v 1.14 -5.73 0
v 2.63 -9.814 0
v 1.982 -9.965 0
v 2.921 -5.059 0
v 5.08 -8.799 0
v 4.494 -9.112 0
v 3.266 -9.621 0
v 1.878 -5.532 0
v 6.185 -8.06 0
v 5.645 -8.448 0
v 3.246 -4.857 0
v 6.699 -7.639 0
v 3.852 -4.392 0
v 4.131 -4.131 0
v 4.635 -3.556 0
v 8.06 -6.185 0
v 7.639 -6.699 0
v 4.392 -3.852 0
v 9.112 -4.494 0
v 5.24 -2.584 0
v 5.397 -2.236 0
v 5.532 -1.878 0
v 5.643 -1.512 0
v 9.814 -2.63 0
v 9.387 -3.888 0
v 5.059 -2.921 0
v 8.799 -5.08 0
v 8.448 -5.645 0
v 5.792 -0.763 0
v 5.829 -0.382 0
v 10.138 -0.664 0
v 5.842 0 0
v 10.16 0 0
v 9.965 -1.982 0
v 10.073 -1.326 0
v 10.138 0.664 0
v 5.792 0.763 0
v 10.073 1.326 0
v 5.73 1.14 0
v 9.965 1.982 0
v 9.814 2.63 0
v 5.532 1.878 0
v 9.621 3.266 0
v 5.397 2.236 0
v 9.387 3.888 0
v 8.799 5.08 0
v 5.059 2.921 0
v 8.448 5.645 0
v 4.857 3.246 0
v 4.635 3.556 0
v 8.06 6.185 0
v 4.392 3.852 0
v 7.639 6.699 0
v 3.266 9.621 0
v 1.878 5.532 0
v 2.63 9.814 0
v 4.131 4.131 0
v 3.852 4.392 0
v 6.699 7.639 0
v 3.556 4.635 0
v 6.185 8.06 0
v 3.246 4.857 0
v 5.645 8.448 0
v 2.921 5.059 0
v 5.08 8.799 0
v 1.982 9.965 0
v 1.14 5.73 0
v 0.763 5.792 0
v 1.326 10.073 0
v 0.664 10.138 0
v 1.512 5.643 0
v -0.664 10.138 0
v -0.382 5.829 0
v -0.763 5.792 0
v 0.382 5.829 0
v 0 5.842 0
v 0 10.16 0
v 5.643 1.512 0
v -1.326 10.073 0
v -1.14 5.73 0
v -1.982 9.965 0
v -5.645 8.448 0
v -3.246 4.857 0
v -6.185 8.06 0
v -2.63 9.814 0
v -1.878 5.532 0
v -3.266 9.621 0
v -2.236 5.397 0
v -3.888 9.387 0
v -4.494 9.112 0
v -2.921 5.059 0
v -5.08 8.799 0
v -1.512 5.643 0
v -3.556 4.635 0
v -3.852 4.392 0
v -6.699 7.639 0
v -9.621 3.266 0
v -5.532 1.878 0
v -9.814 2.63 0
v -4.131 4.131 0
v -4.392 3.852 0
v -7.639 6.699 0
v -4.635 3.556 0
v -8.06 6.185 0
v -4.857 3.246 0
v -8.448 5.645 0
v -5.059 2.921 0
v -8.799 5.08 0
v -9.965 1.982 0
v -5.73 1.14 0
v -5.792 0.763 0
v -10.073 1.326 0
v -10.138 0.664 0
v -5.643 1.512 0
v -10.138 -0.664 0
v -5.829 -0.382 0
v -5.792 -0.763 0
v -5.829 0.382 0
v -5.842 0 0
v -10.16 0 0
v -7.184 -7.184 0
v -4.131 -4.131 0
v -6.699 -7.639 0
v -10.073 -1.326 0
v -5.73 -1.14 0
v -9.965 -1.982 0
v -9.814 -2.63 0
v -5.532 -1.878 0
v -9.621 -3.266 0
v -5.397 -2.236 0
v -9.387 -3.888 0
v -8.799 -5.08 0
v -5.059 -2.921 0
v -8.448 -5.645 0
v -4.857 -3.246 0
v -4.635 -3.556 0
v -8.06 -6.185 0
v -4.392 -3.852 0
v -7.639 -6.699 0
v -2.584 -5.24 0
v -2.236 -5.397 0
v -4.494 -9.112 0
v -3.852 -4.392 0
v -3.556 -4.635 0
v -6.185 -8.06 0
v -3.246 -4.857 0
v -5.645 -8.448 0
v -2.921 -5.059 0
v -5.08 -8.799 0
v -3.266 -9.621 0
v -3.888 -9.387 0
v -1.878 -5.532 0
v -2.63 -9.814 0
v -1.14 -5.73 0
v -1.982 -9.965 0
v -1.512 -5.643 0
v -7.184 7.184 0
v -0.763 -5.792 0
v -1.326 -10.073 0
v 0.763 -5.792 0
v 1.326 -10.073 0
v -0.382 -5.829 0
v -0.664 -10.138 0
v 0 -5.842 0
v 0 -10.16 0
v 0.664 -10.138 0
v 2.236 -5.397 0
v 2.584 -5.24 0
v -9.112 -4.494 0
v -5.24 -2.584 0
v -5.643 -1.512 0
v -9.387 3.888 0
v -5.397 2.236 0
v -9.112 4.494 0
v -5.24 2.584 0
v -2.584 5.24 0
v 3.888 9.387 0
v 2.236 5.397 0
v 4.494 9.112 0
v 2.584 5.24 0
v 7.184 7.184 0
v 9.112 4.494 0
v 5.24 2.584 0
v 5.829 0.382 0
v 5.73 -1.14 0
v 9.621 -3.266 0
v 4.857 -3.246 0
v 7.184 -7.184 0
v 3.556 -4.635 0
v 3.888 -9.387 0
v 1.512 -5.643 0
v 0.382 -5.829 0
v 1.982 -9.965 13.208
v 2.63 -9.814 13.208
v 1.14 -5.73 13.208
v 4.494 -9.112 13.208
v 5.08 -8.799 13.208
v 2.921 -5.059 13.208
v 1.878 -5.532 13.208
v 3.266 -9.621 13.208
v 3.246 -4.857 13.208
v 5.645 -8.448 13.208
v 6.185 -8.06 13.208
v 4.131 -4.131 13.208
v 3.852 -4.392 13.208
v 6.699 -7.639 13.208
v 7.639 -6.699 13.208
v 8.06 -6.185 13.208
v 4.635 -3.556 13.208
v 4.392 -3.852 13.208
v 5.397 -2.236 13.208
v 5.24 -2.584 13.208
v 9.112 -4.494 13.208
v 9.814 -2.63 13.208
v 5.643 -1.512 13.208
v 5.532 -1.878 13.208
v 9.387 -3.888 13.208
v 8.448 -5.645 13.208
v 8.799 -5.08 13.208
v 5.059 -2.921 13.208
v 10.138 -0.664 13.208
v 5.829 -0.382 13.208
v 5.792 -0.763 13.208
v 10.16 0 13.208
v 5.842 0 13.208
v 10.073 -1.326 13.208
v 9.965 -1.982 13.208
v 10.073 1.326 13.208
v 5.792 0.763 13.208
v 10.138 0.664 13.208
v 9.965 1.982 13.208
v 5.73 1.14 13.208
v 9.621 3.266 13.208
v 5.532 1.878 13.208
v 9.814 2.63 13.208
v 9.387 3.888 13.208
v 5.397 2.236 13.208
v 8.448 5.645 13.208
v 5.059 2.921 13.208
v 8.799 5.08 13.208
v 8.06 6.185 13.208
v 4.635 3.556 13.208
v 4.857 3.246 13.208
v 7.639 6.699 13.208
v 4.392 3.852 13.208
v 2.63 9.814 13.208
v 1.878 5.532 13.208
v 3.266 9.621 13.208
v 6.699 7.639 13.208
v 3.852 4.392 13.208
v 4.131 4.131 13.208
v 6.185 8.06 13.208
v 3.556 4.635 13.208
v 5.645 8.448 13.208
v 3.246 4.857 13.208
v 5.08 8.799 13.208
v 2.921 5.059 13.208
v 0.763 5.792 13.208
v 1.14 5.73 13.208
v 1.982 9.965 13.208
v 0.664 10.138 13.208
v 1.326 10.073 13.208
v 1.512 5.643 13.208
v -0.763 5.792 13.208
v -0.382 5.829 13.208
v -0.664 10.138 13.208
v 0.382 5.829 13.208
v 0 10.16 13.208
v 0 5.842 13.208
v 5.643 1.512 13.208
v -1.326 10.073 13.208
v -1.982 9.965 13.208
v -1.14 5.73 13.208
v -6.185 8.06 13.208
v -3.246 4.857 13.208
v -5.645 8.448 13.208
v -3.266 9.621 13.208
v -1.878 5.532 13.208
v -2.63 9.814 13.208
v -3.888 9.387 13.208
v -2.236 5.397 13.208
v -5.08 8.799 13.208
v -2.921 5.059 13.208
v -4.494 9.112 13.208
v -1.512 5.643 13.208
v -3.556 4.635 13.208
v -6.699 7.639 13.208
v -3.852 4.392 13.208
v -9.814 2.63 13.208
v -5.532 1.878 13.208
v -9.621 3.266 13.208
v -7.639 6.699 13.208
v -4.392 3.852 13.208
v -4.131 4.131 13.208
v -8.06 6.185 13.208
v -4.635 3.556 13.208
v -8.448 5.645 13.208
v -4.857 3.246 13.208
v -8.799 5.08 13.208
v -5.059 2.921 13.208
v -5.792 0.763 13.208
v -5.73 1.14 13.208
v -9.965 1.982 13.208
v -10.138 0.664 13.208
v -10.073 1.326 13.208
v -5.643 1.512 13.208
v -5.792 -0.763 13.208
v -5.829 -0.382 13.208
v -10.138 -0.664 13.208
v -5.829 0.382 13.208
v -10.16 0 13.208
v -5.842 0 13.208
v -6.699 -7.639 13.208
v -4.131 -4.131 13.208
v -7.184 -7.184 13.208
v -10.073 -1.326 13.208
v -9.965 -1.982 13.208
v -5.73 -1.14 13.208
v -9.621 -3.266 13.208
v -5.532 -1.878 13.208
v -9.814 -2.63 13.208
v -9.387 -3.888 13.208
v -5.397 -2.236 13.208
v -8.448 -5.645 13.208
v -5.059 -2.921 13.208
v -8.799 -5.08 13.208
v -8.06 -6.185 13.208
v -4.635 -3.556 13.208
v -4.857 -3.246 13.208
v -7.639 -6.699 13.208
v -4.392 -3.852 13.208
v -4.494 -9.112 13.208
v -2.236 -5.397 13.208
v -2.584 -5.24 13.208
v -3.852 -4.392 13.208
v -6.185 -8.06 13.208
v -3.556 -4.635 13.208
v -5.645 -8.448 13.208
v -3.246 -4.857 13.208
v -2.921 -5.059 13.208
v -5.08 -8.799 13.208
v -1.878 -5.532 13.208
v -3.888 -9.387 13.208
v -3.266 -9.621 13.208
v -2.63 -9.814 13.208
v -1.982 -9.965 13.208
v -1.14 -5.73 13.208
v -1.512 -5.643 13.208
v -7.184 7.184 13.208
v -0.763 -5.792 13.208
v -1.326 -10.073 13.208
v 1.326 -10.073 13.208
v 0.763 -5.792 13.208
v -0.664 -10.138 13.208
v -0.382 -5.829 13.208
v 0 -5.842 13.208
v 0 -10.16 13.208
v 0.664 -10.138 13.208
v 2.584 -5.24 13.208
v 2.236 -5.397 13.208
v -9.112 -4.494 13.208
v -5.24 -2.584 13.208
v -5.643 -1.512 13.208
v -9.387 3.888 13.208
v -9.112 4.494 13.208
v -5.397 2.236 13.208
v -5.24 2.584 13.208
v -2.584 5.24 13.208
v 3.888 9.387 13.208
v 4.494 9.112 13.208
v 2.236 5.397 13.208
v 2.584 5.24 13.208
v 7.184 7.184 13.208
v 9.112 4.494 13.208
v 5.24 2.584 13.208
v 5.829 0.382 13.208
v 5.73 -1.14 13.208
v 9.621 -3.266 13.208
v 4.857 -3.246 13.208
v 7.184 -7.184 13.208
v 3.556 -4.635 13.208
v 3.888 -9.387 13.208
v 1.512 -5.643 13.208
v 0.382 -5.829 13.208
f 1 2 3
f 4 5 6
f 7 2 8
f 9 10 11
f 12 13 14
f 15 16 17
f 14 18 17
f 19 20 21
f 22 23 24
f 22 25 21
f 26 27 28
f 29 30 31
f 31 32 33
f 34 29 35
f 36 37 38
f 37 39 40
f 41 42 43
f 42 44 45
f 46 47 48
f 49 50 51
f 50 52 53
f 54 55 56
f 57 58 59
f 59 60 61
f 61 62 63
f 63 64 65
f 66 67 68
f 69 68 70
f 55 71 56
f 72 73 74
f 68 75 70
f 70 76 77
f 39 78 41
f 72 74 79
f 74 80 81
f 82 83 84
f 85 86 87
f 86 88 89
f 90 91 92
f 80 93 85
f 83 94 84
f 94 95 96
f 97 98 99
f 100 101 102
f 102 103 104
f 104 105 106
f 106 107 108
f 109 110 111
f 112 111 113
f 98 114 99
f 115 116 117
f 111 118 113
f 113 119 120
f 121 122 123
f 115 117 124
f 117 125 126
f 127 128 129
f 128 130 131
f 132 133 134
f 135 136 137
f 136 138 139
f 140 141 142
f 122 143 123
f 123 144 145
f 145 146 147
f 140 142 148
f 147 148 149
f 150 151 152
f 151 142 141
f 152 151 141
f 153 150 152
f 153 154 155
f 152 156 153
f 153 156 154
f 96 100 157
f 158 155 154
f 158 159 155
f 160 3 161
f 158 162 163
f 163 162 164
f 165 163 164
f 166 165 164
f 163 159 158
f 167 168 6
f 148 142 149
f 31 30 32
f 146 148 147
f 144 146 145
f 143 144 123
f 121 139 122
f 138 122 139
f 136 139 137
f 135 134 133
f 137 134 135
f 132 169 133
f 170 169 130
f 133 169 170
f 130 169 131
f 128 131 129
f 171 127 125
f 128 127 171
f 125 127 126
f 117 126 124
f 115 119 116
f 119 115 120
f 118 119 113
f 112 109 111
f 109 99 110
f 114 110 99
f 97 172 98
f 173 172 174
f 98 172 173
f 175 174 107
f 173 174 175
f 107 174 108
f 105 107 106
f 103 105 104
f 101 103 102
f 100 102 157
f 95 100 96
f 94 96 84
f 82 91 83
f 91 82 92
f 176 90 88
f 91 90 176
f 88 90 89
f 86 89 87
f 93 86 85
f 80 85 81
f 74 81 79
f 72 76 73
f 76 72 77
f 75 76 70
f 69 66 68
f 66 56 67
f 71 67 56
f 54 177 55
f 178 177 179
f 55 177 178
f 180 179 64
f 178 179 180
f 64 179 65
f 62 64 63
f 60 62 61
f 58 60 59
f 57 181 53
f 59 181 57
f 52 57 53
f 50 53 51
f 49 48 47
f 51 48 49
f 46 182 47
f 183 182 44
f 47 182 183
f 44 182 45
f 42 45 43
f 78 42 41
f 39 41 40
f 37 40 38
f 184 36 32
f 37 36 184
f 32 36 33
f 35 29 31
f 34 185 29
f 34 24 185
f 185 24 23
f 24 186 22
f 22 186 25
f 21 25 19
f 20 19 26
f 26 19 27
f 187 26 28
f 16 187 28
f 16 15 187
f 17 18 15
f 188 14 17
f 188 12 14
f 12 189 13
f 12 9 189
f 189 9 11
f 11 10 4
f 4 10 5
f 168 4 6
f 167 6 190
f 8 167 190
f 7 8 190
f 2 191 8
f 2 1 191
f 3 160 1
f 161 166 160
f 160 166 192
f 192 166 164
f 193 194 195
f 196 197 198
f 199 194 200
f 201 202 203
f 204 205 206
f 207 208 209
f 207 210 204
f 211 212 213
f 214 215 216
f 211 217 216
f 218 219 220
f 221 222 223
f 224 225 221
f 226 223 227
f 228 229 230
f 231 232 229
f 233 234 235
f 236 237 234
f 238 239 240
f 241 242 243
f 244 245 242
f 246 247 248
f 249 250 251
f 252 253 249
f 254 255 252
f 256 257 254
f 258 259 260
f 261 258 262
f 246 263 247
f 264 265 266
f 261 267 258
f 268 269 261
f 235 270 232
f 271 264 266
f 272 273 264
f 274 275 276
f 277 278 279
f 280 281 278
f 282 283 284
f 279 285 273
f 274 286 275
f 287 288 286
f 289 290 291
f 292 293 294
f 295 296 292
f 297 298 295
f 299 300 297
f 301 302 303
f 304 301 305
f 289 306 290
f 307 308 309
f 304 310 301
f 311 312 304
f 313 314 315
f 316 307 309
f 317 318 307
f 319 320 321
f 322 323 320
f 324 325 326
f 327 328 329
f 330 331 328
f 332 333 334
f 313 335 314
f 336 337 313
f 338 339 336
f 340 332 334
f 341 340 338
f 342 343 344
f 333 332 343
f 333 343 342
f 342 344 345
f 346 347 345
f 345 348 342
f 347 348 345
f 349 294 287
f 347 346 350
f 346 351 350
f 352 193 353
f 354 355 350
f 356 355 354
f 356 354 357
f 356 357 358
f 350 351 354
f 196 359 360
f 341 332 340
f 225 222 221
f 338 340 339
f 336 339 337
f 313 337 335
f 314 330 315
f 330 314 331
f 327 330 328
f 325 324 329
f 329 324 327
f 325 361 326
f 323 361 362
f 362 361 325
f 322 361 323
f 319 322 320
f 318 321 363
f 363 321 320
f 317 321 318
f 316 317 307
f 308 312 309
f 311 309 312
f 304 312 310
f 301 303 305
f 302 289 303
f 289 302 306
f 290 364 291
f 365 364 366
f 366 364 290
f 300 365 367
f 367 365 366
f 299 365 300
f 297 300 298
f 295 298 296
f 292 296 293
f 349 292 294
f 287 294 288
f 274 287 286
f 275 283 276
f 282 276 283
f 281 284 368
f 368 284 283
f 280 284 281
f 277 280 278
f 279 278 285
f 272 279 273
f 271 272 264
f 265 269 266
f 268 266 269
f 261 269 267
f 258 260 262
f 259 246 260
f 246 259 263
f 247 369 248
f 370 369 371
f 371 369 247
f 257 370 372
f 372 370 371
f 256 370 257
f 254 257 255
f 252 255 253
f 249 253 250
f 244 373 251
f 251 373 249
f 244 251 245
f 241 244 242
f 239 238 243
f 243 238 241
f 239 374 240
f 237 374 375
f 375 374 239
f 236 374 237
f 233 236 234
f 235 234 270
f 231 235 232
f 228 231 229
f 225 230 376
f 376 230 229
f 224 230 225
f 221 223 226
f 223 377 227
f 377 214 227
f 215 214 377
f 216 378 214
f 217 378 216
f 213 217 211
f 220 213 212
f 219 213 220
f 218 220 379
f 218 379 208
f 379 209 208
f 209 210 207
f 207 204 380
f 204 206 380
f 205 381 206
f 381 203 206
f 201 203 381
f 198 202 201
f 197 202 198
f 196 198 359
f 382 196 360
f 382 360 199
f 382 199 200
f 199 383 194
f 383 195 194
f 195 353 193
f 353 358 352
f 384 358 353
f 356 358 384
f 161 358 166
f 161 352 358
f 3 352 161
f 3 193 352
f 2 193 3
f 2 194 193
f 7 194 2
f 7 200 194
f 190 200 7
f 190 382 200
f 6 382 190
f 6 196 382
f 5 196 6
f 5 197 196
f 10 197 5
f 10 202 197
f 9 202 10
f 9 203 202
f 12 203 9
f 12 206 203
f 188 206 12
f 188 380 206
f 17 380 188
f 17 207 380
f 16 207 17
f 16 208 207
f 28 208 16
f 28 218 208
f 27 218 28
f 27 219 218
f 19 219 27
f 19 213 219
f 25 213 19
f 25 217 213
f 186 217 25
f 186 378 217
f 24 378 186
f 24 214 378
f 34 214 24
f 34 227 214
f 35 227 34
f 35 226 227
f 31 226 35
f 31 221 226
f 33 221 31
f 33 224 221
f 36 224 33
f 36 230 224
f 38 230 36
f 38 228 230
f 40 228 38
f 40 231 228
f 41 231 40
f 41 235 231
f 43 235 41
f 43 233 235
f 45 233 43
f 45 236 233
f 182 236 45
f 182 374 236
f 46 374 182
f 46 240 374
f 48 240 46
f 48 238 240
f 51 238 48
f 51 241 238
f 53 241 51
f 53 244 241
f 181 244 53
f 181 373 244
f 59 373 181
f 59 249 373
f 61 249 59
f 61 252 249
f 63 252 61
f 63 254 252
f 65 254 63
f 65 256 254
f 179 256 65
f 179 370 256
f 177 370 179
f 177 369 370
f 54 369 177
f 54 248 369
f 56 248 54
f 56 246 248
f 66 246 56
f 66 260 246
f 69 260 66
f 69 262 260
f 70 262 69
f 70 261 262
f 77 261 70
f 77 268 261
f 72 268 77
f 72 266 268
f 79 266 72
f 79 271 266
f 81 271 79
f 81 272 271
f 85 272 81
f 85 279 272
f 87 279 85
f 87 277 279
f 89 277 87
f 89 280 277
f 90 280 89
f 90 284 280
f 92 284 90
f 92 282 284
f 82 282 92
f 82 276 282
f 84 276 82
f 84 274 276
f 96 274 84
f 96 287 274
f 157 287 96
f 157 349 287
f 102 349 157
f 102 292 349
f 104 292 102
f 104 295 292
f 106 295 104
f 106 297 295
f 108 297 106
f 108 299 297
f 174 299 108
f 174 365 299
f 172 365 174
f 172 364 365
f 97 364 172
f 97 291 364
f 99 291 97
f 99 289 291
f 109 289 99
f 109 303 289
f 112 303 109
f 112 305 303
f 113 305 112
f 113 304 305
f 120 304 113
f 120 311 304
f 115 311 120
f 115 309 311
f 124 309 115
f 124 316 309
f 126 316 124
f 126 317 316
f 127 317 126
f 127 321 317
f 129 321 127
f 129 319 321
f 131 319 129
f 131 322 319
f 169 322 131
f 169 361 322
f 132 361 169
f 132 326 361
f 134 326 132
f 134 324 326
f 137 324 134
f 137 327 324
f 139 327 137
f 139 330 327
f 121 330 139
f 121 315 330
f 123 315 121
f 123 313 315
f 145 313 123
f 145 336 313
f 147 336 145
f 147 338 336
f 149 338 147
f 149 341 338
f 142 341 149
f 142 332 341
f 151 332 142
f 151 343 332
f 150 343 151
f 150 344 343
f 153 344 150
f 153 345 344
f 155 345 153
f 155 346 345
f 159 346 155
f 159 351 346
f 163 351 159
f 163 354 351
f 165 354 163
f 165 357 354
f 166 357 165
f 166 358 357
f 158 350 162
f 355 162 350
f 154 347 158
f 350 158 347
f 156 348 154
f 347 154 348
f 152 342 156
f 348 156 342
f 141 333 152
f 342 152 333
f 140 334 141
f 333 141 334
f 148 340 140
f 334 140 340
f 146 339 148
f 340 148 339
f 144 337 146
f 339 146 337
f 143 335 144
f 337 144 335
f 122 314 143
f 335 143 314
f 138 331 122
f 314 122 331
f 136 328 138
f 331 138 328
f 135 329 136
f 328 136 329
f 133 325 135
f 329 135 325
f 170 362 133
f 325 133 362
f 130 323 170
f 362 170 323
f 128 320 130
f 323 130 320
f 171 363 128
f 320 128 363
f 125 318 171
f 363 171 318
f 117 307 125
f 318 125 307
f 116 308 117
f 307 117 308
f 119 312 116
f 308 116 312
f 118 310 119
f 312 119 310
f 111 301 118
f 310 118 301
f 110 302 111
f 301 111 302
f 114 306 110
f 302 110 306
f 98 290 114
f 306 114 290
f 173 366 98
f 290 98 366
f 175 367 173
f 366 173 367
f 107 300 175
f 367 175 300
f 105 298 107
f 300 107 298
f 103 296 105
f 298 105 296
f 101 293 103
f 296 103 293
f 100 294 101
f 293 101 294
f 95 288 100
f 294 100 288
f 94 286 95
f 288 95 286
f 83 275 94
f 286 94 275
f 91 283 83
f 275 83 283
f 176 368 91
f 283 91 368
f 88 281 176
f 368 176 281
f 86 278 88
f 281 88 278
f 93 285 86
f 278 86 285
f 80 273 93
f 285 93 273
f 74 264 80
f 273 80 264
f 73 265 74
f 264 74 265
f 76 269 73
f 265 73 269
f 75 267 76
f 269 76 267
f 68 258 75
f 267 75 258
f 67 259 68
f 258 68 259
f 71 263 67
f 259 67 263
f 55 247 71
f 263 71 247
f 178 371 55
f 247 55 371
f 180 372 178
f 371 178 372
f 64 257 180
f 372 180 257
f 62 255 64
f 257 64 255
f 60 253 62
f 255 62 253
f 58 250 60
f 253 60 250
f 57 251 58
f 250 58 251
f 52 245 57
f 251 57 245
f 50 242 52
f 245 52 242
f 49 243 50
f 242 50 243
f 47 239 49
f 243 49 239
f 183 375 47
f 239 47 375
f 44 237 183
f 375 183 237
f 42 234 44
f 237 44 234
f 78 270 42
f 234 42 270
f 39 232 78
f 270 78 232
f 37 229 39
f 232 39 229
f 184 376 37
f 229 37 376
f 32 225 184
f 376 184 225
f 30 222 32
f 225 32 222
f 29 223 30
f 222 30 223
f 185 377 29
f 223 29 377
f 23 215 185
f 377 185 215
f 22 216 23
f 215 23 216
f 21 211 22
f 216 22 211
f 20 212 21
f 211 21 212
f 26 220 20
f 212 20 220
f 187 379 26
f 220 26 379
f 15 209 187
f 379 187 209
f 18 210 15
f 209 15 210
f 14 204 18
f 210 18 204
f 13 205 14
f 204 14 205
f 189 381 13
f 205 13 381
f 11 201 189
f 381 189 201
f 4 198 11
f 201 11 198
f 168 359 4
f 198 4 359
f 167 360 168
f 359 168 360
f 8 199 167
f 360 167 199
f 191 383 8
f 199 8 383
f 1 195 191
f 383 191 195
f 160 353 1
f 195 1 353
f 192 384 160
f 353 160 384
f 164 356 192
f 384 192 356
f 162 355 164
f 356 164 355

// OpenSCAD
// file: defs.scad
RealityScale = [1.27, 1.27, 1.27];
ViewScale = [0.0254, 0.0254, 0.0254];
JointVertSpace=20;
LayerUnit=300;
SpacedLayer=LayerUnit+JointVertSpace;
JointR = 400;
ShaftR = 200;
ShaftHole=220;
ShaftTight=230; // wood PLA
//ShaftTight=205; plastic PLA
HexTight=210;
MagicMult = 50;
StrutWidth = 400;
rrectR = 100;
ShaftSleeve = 200;

// Spine Horizontal
MagicA = MagicMult * 38;
// Spine Verticial
MagicL = MagicMult * 7.8;

// Leg Triangle
MagicG = MagicMult * 36.7; // a
MagicH = MagicMult * 65.7; // c
MagicI = MagicMult * 49;   // b

// Driver Triangle
MagicB = MagicMult * 41.5;
MagicD = MagicMult * 40.1;
MagicE = MagicMult * 55.8;

// Front Strut
MagicC = MagicMult * 39.3;
FsLen = MagicC;

// Back Strut
MagicF = MagicMult * 39.4;
BsLen = MagicF;

// Lower Driver Strut
MagicK = MagicMult * 61.9;

// Upper Driver Strut
MagicJ = MagicMult * 50;

// Cam radius
MagicM = MagicMult * 15;

spineLength = sqrt(pow(MagicA, 2) + pow(MagicL,2));
// main file
include <defs.scad>

StrutWidth = 400;
rrectR = 100;
//LayerUnit = 300;
JointVertSpace=20;
//ShaftHole=220;
ShaftSleeve = 200;

module rectHull(r, x, y)
{
    hull()
    {
        // place 4 circles in the corners, with the given r
        translate([(-x/2)+(r/2), (-y/2)+(r/2), 0])
            circle(r=r);

        translate([(x/2)-(r/2), (-y/2)+(r/2), 0])
            circle(r=r);

        translate([(-x/2)+(r/2), (y/2)-(r/2), 0])
            circle(r=r);

        translate([(x/2)-(r/2), (y/2)-(r/2), 0])
            circle(r=r);
    }
}

// rounded rectangle
module rrect(z, y, x)
{
    y = y - rrectR;
    x = x - rrectR;
    //translate([0, rrectR+x/2, y/2]) // rrectR/2+y/2])
    translate([0, rrectR+x/2, x/2+rrectR/4]) // rrectR/2+y/2])
    rotate([0, 90, 0]) 
    linear_extrude(z)
    rectHull(rrectR/2, x, y);
}

module halfSpine2(layers)
{
    linkLength = 520;
    baseHeight = LayerUnit * 2 + JointVertSpace + (3 * SpacedLayer) - 20;
    shaftHeight = SpacedLayer * 2 + linkLength - 70;
    // insertion hole
    linear_extrude(linkLength) 
    difference() {
        circle(JointR, $fn=96);
        circle(ShaftTight, $fn=96);
    }

    // base
//    translate([0, 0, linkLength])
//    linear_extrude(baseHeight - linkLength) 
//    circle(JointR, $fn=96);

//    // shaft
//    translate([0, 0, baseHeight-1])
//    linear_extrude(shaftHeight) 
//    difference() {
//        circle(ShaftR, $fn=96);
//        circle(40, $fn=4);
//    }
//
//    // central hole
//    translate([spineLength, 0, SpacedLayer * 2 -20])
//    linear_extrude(LayerUnit) 
//    difference() {
//        circle(JointR, $fn=96);
//        circle(ShaftHole, $fn=96);
//    }
//    translate([0,-200,2*SpacedLayer])
//    difference() {
//        rrect(spineLength, StrutWidth*2, LayerUnit);
//        // bite out of central end
//        translate([spineLength, StrutWidth/2, -1])
//        linear_extrude(LayerUnit)
//        circle(ShaftHole, $fn=96);
//        // bit out of base end
//        translate([0, StrutWidth/2, -1])
//        linear_extrude(LayerUnit)
//        circle(ShaftHole, $fn=96);
//    }

}

module halfSpine(layers)
{
    linkLength = 520;
    layerSpace = SpacedLayer*layers;
    baseHeight = LayerUnit * 2 + JointVertSpace + (3 * SpacedLayer) - 20;
    shaftHeight = SpacedLayer * 2 + linkLength- 70;

    difference() {
        union() {
            // shaft + base
                difference(){
                    union() {
                    #cylinder(baseHeight, r=JointR,$fn=96); // base
                    translate([0, 0, baseHeight])
                        cylinder(shaftHeight, r=ShaftR,$fn=96); // shaft
                    // strut
// temp                    translate([0,-200,2*SpacedLayer]) rrect(spineLength, StrutWidth*2, LayerUnit);
                }
                union() {
                // hole in shaft
                translate([0, 0, -2]) cylinder(baseHeight + shaftHeight,r=40,$fn=4);
                // insertion hole
                translate([0, 0, -1]) cylinder(linkLength, r=ShaftTight, $fn=96);
                }
                }
            // central joint
// temp            translate([spineLength,0,SpacedLayer * 2-20]) cylinder(LayerUnit, r=JointR, $fn=96);
        }
        // shaft hole
        translate([spineLength,0,SpacedLayer*1-1]) cylinder(LayerUnit*3, r=ShaftHole, $fn=96);
    }
}

// upper
module cam()
{
    shaftHeight = SpacedLayer * 5;
    // Cam
//    translate([0, 0, 0]) { difference() {
        union() {
            // shaft
            translate([0, 0, LayerUnit]) cylinder(shaftHeight, r=ShaftR, $fn=96);
            translate([0, 0, 0]) cylinder(LayerUnit, r=JointR, $fn=96);
            // strut
            translate([0, -200, 0]) cube([MagicM, 400, LayerUnit]);
            // central shaft
            translate([MagicM,0,0]) cylinder(LayerUnit, r=JointR, $fn=96);
        }
        // hex cutout
//        translate([MagicM,0,-10]) cylinder(220, r=ShaftTight, $fn=96);
//        }
//    }
}

// lower
module cam2()
{
    shaftHeight = SpacedLayer * 2 + JointVertSpace;
    // Cam
    translate([0, 0, 0]) { difference() {
        union() {
            // shaft
            translate([0, 0, 0]) cylinder(shaftHeight, r=ShaftR, $fn=96);
            // shaft circle
            translate([0, 0, 0]) cylinder(LayerUnit, r=JointR, $fn=96);
            // strut
            translate([0, -200, 0]) cube([MagicM, 400, LayerUnit]);
            // central shaft
            translate([MagicM,0,0]) cylinder(LayerUnit, r=JointR, $fn=96);
        }
        translate([MagicM,0,-1]) cylinder(LayerUnit+2, r=ShaftTight, $fn=96);
        }
    }
}

// Outer joint plus half the rod
module spine(layers) {
    //halfSpine(layers);
    halfSpine2(layers);
}

// Inner joint plus half the rod
module strutB(rodw, rodl)
{
    // Inner joint
//    translate([0, 0, 100+JointVertSpace]) 
        difference() {
            // Inner joint
            cylinder(100, r=400,$fn=96);
            // Shaft hole
            translate([0,0,-10]) cylinder(120, r=ShaftHole,$fn=96);
        }
      translate([260,-rodw/2,0]) cube([rodl-260,rodw,100]);
}

module strutAA(rodw, rodl, layers) {
    strutA(rodw, rodl/2, layers);
    translate([rodl, 0, 0]) rotate([0, 0, 180]) strutA(rodw, rodl/2, layers);
}

module strutBB(rodw, rodl) {
    strutB(rodw, rodl/2, 0);
    translate([rodl, 0, 0]) rotate([0, 0, 180]) strutB(rodw, rodl/2);
}

module strutAB(rodw, rodl, layers) {
    strutA(rodw, rodl/2, layers);
    translate([rodl, 0, 0]) rotate([0, 0, 180]) strutB(rodw, rodl/2);
}

module strutBA(rodw, rodl, layers) {
    strutB(rodw, rodl/2);
    translate([rodl, 0, 0]) rotate([0, 0, 180]) strutA(rodw, rodl/2, layers);
}


function loCosA(lenA, lenB, lenC) =
    acos(((lenB * lenB) + (lenC * lenC) - (lenA * lenA)) / (2 * lenB * lenC));

function loCosB(lenA, lenB, lenC) =
     acos(((lenA * lenA) + (lenC * lenC) - (lenB * lenB)) / (2 * lenA * lenC));

function loCosC(lenA, lenB, lenC) =
     acos(((lenA * lenA) + (lenB * lenB) - (lenC * lenC)) / (2 * lenA * lenB));

module triangle(rodw, lenA, lenB, lenC) {
    strutBB(rodw, lenC);
    rotate([0, 0, loCosA(lenA, lenB, lenC)]) strutBB(rodw, lenB);
    translate([lenC, 0, 0]) rotate([0, 0, 180-loCosB(lenA, lenB, lenC)]) strutBB(rodw, lenA);
}

module collar() {
    // Collar
    difference() {
        cylinder(150, r=JointR, $fn=96);
        translate([0, 0, -2]) cylinder(SpacedLayer*3+5, r=ShaftTight, $fn=96);
    }
}

scale(ViewScale) {
    spine(5);
    //cam();
//    cam2()
//    translate([1700, -300, 0]) cam2();
//    translate([0, -2200, 0]) collar();
//    translate([1500, -2200, 0]) collar();

    // Drill driver
//    *translate([0, -2000, 0]) cylinder(1000, r=ShaftR, $fn=6);
}
